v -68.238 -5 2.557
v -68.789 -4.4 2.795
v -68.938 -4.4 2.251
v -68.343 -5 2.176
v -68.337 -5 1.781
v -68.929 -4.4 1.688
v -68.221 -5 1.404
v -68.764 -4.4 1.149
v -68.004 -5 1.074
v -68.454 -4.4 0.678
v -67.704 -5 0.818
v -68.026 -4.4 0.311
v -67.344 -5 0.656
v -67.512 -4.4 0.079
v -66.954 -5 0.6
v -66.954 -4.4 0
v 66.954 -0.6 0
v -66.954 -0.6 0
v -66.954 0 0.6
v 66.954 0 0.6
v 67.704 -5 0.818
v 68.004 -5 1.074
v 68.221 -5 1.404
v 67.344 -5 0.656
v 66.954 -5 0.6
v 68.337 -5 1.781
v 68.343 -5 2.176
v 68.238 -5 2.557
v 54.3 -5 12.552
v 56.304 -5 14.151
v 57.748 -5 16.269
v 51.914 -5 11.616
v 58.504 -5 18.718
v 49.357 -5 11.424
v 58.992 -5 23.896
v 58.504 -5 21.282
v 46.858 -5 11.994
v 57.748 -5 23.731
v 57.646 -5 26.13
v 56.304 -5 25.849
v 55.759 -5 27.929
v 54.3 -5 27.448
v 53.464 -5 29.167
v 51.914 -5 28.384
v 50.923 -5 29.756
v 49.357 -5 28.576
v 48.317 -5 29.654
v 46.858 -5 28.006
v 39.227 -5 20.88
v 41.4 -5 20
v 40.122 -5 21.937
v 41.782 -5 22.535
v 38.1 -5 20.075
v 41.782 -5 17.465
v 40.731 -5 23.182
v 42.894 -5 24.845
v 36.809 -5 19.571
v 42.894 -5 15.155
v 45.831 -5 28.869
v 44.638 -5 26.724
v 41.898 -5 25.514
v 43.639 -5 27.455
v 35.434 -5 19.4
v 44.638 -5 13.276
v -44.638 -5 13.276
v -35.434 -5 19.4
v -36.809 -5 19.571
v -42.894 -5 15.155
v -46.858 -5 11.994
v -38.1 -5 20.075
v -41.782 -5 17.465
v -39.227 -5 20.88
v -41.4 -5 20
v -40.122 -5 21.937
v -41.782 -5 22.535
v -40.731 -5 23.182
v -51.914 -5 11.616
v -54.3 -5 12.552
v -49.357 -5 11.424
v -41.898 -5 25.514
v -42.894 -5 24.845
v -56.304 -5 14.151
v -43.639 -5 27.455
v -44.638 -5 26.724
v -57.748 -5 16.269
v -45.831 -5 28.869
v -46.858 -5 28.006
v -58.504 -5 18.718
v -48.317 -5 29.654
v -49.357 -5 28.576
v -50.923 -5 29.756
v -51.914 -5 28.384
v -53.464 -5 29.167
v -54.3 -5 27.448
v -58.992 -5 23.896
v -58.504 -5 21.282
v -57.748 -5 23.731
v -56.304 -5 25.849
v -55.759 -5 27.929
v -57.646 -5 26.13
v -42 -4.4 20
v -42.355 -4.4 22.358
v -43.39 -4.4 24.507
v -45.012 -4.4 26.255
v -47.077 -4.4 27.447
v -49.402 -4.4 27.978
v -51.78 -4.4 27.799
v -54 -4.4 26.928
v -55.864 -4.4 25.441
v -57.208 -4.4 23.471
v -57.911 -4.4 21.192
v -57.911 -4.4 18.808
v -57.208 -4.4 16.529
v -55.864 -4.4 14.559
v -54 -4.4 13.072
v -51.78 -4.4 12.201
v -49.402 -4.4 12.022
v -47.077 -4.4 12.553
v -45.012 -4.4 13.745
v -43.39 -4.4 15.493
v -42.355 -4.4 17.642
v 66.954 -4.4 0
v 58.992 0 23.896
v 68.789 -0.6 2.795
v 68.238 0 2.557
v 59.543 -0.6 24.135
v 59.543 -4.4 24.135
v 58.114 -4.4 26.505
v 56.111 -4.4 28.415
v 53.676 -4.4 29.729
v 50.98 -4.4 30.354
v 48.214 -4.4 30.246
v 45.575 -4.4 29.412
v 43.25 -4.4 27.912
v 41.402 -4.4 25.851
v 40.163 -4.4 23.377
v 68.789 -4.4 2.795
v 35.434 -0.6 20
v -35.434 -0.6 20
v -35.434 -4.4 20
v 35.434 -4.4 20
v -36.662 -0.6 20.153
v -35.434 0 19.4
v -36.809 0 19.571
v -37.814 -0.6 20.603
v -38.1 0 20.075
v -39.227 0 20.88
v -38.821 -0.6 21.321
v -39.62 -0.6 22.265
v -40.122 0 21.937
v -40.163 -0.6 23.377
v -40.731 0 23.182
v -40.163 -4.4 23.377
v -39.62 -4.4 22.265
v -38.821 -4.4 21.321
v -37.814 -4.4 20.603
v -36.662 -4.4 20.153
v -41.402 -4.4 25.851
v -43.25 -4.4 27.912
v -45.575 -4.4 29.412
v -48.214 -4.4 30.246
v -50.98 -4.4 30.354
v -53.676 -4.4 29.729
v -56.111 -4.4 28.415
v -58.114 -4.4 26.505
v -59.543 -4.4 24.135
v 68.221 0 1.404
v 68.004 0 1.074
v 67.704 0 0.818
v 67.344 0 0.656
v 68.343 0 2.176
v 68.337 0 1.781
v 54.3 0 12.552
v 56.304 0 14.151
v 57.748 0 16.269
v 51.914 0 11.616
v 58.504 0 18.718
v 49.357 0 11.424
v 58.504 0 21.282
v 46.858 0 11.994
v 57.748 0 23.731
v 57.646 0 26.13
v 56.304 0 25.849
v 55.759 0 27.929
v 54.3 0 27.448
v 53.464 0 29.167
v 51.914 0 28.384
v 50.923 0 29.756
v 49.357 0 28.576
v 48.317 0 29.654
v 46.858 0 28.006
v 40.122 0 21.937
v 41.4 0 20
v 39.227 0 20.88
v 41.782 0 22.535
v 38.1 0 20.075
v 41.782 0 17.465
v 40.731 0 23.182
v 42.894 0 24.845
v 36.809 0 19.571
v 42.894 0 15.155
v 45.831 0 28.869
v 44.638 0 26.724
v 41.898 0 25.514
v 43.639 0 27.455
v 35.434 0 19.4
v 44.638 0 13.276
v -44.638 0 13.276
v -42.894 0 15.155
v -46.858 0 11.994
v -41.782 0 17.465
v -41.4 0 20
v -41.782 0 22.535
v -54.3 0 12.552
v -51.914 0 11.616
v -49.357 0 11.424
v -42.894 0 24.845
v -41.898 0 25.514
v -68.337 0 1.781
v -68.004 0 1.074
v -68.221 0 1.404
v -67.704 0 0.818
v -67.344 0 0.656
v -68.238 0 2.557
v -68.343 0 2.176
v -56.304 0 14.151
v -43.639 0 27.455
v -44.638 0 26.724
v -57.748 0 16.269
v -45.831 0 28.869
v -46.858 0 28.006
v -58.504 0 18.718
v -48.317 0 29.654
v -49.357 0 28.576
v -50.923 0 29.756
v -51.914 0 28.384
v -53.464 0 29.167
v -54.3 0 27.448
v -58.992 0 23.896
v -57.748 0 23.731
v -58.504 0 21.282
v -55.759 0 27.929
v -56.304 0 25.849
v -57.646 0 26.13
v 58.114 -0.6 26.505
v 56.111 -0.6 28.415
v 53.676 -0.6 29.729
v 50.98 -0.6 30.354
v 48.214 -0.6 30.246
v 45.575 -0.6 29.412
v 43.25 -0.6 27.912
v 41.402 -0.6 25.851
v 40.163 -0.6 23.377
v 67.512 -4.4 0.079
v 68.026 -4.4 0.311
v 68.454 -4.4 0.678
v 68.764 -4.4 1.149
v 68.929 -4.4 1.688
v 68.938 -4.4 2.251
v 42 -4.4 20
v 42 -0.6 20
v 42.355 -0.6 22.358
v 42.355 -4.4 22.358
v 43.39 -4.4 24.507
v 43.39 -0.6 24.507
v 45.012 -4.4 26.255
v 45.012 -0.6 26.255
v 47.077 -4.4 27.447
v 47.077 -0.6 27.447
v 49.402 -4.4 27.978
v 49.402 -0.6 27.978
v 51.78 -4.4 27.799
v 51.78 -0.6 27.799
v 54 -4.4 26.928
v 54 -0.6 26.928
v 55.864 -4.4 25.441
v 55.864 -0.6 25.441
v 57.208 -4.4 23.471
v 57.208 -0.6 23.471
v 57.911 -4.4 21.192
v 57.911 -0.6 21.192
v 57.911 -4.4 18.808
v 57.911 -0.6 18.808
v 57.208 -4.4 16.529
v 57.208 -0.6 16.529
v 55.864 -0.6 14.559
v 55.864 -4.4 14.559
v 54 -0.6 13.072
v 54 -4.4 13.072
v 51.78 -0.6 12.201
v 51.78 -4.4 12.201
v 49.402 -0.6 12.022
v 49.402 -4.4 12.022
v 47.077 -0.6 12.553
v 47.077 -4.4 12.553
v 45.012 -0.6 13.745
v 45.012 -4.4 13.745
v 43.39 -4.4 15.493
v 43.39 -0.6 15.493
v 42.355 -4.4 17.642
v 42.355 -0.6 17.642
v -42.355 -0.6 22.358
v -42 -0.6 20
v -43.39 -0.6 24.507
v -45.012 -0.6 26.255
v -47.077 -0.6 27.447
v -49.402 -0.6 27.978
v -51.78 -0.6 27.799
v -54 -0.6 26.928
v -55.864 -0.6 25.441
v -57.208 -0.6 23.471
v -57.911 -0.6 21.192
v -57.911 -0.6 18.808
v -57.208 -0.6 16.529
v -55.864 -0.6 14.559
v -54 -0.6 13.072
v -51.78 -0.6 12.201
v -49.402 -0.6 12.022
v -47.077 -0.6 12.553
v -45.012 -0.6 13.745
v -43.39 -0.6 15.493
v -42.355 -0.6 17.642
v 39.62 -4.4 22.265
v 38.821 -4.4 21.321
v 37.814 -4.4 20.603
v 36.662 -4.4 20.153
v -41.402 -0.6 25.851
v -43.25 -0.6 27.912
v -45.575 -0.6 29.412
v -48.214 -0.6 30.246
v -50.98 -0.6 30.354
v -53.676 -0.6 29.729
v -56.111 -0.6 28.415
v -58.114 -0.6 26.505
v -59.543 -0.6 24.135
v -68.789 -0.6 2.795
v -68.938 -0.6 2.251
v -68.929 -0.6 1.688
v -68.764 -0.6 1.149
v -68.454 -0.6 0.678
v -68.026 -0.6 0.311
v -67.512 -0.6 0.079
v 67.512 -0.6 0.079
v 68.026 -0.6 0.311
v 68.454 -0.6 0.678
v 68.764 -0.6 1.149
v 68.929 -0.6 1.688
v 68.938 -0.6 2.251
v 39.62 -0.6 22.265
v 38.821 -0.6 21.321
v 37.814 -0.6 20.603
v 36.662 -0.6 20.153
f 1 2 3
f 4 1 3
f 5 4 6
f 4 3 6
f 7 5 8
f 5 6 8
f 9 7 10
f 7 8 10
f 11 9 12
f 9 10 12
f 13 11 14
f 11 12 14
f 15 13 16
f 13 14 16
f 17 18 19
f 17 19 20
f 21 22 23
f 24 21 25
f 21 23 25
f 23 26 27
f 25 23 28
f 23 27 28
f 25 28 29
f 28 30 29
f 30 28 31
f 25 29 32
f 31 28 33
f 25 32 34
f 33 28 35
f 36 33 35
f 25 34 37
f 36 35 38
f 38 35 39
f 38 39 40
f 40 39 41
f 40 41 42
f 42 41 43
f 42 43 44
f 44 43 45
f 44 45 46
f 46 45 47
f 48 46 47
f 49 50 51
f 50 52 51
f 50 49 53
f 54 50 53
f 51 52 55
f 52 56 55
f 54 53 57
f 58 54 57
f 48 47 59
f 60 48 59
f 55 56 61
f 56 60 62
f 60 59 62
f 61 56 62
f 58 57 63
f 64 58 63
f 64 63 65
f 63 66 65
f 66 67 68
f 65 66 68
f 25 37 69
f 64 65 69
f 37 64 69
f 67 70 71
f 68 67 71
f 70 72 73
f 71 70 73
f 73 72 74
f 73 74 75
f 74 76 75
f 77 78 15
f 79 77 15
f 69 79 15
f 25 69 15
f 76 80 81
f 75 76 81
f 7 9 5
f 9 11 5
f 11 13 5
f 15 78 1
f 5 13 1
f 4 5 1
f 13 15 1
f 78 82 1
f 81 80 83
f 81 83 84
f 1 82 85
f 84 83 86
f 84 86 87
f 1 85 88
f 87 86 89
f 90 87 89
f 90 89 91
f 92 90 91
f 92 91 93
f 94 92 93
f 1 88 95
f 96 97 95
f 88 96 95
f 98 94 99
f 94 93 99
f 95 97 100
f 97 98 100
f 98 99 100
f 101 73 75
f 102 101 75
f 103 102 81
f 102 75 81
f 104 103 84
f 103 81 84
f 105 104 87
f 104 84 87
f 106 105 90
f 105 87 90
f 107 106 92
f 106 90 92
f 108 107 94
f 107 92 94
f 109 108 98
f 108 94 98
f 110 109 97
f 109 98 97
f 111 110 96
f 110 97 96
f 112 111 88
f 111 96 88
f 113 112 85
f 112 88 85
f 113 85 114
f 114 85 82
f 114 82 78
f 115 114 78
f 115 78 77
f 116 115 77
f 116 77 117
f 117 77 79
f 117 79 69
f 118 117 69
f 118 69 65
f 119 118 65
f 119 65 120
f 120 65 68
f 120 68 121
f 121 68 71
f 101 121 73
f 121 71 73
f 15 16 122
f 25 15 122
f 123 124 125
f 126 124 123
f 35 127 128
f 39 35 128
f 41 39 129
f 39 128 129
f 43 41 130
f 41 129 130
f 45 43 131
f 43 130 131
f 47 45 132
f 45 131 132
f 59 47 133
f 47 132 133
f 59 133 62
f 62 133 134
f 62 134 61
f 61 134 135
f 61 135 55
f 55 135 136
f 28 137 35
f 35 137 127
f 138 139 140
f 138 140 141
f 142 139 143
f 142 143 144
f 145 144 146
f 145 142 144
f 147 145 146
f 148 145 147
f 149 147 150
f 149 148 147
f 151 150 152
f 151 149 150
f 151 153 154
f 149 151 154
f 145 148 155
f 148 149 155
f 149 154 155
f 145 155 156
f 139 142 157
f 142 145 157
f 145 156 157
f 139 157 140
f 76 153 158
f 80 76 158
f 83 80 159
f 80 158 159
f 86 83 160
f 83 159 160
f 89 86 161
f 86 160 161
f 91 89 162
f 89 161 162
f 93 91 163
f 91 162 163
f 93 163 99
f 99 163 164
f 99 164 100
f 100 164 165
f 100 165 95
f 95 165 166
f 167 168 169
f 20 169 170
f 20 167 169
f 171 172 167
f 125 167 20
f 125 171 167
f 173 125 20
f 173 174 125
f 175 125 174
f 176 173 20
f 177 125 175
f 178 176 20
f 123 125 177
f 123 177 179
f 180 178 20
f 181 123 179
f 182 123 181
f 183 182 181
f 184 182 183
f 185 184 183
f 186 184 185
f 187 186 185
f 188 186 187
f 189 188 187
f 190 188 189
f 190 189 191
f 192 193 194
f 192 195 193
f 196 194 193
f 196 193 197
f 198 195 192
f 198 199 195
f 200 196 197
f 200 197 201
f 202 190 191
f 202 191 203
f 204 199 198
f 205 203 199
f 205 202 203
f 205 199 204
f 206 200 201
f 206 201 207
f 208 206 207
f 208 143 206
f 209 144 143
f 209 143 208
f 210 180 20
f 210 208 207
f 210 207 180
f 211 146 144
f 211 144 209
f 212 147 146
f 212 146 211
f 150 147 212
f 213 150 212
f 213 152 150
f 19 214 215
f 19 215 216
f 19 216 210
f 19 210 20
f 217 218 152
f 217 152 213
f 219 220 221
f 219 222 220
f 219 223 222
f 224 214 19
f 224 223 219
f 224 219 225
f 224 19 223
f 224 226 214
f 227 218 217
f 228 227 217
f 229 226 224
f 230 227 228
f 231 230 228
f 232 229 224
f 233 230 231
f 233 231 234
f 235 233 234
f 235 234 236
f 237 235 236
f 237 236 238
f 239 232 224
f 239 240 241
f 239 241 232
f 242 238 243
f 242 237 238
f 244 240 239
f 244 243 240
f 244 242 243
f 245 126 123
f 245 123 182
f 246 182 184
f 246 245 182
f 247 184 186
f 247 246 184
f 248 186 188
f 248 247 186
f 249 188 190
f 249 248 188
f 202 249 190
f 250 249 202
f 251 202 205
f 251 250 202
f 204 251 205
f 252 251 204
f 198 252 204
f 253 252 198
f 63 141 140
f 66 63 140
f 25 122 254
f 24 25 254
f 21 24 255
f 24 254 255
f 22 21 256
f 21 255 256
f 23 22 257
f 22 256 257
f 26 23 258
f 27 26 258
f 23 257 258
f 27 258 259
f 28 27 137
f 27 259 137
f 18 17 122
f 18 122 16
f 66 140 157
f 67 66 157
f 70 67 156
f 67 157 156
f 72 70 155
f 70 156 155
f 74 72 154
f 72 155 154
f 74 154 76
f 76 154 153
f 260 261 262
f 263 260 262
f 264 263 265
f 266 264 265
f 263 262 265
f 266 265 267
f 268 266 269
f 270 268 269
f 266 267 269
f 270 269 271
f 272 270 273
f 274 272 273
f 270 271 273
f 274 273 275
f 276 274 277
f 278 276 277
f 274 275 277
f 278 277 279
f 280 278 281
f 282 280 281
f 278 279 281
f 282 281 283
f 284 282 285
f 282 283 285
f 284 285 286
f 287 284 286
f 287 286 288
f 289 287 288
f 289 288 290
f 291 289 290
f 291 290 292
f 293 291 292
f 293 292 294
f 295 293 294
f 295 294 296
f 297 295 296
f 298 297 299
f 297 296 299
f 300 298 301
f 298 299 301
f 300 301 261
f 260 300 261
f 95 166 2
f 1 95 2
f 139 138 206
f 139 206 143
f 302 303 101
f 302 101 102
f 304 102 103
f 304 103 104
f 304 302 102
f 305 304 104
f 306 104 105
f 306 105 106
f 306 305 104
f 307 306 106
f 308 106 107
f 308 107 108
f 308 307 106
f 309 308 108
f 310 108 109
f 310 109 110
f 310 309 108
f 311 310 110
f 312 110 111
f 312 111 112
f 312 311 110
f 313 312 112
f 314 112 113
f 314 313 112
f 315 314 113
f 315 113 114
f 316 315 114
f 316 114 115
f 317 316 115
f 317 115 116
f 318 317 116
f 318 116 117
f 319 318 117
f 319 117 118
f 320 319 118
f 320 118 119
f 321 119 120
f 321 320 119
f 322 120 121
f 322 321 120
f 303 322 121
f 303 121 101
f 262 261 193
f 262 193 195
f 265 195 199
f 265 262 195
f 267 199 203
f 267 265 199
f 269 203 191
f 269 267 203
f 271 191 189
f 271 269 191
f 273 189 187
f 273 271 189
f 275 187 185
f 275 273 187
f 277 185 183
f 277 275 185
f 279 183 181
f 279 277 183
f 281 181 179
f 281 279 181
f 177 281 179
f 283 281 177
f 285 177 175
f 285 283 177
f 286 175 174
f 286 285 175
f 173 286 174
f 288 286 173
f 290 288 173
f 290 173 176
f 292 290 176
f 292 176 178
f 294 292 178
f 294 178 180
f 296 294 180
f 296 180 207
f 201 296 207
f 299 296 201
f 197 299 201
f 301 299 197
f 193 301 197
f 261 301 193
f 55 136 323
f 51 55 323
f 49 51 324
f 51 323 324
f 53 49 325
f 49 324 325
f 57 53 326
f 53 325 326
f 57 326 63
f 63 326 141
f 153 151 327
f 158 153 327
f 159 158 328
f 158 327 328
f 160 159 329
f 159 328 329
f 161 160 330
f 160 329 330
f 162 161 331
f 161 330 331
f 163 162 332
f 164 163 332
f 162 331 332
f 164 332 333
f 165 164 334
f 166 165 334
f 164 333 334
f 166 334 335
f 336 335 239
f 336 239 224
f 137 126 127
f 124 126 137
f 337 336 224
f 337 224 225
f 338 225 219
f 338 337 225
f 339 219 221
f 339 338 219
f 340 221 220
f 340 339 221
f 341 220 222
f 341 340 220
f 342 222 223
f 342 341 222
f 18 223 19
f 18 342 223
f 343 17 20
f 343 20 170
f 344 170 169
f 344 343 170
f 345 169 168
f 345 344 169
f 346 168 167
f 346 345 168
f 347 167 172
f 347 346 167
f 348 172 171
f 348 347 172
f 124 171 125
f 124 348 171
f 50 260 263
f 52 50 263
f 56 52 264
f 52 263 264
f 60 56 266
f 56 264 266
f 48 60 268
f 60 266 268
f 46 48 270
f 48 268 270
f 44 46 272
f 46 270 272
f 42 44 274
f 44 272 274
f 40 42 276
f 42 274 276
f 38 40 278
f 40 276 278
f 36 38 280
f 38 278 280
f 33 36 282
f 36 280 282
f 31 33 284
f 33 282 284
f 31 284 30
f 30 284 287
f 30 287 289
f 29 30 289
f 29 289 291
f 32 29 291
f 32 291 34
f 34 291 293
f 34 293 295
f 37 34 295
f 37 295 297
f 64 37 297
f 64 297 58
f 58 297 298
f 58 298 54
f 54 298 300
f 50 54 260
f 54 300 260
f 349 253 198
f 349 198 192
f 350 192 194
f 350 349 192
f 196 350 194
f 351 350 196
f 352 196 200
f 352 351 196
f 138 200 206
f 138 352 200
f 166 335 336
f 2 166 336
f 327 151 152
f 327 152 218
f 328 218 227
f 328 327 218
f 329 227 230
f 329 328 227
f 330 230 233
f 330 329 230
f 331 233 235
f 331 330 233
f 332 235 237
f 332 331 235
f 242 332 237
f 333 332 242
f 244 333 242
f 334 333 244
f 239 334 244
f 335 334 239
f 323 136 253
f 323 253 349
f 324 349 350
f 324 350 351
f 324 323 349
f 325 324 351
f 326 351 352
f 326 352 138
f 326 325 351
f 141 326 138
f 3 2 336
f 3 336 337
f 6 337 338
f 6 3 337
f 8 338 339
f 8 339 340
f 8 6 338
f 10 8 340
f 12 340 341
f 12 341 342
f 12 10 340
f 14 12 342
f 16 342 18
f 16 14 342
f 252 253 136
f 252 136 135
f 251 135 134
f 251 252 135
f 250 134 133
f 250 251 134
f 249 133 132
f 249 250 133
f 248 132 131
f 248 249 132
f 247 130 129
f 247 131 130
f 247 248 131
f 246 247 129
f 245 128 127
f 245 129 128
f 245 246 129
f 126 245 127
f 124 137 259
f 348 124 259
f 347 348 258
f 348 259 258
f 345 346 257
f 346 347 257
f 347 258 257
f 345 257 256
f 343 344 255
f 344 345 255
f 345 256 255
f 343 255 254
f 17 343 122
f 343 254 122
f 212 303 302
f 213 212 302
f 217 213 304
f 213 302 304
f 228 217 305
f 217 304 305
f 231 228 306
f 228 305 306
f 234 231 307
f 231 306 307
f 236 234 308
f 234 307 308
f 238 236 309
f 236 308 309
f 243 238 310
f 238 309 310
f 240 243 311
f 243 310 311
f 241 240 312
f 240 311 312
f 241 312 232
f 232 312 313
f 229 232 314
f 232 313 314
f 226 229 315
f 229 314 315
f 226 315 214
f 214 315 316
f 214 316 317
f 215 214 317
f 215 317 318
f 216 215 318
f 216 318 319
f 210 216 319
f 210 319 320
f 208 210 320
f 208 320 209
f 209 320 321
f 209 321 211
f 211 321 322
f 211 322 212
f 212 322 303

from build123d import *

# Parameters (mm, degrees)
F0_R     = 8
F1_DEPTH = 5
F2_R     = 5
F3_R     = 2
F5_SIZE  = 0.6


with BuildPart() as f1:
    # F0 (on Front) → F1 (new body)
    with BuildSketch(Plane.XZ):
        with BuildLine():
            ThreePointArc((-59.542741, 24.134741), (-52.111337, 9.81657), (-39.6, 20))
            ThreePointArc((-39.6, 20), (-47.888663, 30.18343), (-59.542741, 24.134741))
        make_face()
        with Locations((-50, 20)):
            Circle(F0_R, mode=Mode.SUBTRACT)
        with BuildLine():
            Line((0, 20), (-39.6, 20))
            ThreePointArc((-39.6, 20), (-52.111337, 9.81657), (-59.542741, 24.134741))
            Line((-59.542741, 24.134741), (-70, 0))
            Line((-70, 0), (-30, 0))
            Line((-30, 0), (0, 0))
            Line((0, 0), (0, 20))
        make_face()
    extrude(amount=F1_DEPTH)

    # F2
    f2_edges = [f1.edges().sort_by_distance(p)[0] for p in [
        (-39.6, -2.5, 20),
        (-59.542741, -2.5, 24.134741),
    ]]
    fillet(f2_edges, radius=F2_R)

    # F3
    f3_edges = [f1.edges().sort_by_distance(p)[0] for p in [
        (-70, -2.5, 0),
    ]]
    fillet(f3_edges, radius=F3_R)

    # F4: F1 across face


with BuildPart() as f1_1:
    add(f1.part)
    add(f1.part.mirror(Plane(origin=(0, -2.5, 10), x_dir=(0, 1, 0), z_dir=(1, 0, 0))))

    # F5
    f5_edges = [f1_1.edges().sort_by_distance(p)[0] for p in [
        (-64.165822, -5, 13.464942),
        (-68.625628, -5, 0.90234),
        (0, -5, 0),
        (68.625628, -5, 0.90234),
        (64.165822, -5, 13.464942),
        (49.593464, -5, 30.392051),
        (38.339723, -5, 20.930793),
        (0, -5, 20),
        (-38.339723, -5, 20.930793),
        (-49.593464, -5, 30.392051),
        (-58, -5, 20),
        (58, -5, 20),
        (-64.165822, 0, 13.464942),
        (-68.625628, 0, 0.90234),
        (0, 0, 0),
        (68.625628, 0, 0.90234),
        (64.165822, 0, 13.464942),
        (49.593464, 0, 30.392051),
        (38.339723, 0, 20.930793),
        (0, 0, 20),
        (-38.339723, 0, 20.930793),
        (-49.593464, 0, 30.392051),
        (-58, 0, 20),
        (58, 0, 20),
    ]]
    chamfer(f5_edges, length=F5_SIZE)


solid = f1_1.part
